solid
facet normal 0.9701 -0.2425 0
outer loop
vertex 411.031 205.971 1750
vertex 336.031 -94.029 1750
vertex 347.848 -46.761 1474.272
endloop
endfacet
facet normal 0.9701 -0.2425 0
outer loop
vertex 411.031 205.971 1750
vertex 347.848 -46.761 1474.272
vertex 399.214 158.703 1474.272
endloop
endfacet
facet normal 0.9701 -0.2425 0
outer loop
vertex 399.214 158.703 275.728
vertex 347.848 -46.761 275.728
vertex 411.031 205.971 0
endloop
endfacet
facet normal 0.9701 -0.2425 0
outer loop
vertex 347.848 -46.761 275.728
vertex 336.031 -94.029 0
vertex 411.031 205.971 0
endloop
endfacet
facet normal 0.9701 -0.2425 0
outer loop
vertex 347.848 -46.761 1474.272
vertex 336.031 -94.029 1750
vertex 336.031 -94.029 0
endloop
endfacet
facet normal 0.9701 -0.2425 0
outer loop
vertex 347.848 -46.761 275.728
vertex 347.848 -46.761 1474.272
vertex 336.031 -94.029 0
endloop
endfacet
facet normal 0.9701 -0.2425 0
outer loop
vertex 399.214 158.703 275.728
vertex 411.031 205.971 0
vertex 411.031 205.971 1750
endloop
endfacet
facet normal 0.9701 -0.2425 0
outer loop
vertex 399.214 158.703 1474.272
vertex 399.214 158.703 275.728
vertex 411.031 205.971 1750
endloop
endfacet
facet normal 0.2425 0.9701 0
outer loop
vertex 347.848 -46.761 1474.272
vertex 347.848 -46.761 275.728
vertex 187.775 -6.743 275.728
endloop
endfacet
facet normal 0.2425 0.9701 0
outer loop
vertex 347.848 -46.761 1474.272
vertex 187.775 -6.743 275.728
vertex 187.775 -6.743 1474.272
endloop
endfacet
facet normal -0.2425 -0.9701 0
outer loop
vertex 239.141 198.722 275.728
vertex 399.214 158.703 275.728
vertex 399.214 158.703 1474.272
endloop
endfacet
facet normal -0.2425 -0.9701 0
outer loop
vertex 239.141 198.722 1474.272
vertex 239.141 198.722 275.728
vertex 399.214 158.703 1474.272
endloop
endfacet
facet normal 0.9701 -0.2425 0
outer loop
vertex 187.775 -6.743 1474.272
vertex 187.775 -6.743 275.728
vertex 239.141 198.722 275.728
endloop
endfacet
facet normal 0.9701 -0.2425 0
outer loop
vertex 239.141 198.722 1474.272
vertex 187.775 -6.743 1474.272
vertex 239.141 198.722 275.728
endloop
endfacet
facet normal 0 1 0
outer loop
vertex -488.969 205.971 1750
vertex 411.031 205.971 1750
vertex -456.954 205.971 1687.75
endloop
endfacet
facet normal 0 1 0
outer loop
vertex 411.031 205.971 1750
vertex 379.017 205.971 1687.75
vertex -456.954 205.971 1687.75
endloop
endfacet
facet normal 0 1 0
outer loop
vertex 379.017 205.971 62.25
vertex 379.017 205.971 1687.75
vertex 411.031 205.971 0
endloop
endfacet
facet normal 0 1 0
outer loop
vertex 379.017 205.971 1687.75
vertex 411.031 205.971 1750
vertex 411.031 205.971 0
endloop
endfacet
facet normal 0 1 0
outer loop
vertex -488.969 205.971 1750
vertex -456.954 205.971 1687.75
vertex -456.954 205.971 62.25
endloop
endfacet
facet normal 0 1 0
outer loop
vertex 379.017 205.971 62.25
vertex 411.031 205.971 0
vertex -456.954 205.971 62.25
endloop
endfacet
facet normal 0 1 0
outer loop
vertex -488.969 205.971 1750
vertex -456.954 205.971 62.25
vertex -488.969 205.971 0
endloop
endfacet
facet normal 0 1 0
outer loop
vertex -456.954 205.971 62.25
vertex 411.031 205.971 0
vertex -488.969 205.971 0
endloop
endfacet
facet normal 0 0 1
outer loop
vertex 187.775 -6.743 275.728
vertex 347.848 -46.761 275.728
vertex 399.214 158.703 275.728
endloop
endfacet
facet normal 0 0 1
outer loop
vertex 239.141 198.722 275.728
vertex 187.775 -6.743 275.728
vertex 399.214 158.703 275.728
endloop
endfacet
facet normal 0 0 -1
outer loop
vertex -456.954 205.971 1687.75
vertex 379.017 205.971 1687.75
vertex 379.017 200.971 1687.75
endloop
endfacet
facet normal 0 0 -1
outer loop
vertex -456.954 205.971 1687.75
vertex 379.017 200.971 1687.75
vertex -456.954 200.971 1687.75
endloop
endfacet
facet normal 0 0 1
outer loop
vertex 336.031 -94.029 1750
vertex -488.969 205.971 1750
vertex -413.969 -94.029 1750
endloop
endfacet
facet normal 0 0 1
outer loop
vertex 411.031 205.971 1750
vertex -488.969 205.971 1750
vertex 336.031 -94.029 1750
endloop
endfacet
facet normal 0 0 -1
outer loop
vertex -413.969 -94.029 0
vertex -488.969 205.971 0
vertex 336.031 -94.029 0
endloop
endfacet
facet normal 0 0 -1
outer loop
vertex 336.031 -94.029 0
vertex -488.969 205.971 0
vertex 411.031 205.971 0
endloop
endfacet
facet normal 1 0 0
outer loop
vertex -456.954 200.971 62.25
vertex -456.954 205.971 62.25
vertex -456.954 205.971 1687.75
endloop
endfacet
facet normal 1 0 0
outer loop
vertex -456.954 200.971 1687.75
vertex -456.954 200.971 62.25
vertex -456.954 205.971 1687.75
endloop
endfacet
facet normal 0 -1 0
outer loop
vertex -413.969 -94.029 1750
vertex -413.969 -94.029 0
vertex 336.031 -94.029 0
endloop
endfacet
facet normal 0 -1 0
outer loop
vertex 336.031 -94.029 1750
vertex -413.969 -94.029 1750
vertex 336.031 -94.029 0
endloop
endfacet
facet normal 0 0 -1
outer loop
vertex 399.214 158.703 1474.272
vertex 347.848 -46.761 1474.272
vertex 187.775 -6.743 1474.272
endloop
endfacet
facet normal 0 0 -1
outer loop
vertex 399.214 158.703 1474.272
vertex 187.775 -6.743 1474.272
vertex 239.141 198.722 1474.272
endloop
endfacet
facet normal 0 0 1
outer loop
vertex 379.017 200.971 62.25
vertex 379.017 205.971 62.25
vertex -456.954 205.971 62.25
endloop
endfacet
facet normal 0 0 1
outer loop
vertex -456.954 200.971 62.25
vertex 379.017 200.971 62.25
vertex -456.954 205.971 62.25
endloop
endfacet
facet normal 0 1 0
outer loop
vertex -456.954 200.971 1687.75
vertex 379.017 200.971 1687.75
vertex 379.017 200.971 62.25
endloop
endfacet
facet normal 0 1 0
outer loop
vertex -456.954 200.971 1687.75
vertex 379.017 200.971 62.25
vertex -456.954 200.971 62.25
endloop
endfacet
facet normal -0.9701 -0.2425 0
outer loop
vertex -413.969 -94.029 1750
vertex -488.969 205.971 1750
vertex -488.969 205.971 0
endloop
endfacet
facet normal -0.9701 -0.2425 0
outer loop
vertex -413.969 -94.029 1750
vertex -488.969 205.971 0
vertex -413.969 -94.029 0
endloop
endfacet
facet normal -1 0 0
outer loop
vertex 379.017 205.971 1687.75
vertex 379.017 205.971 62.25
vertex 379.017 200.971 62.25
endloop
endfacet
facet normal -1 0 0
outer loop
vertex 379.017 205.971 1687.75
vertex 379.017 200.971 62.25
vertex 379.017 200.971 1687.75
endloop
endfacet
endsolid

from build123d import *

# Parameters (mm, degrees)
F1_DEPTH = 1750
F2_W     = 835.971278
F2_H     = 1625.499708
F3_DEPTH = 5
F4_W     = 211.788026
F4_H     = 1198.5433
F5_DEPTH = 165


with BuildPart() as f1:
    # F0 (on Top) → F1 (new body)
    with BuildSketch(Plane.XY):
        Polygon((-488.9687, 205.970883), (-413.9687, -94.029117), (336.0313, -94.029117), (411.0313, 205.970883), (-38.9687, 205.970883), align=None)
    extrude(amount=F1_DEPTH)

    # F2 (on face) → F3 (cut)
    with BuildSketch(Plane(origin=(0, 205.970883, 0), x_dir=(-1, 0, 0), z_dir=(0, 1, 0))):
        with Locations((38.9687, 875)):
            Rectangle(F2_W, F2_H)
    extrude(amount=-F3_DEPTH, mode=Mode.SUBTRACT)

    # F4 (on face) → F5 (cut)
    with BuildSketch(Plane(origin=(338.389251, -84.597313, 0), x_dir=(0.242536, 0.970143, 0), z_dir=(0.970143, -0.242536, 0))):
        with Locations((144.89438, 875)):
            Rectangle(F4_W, F4_H)
    extrude(amount=-F5_DEPTH, mode=Mode.SUBTRACT)


solid = f1.part
